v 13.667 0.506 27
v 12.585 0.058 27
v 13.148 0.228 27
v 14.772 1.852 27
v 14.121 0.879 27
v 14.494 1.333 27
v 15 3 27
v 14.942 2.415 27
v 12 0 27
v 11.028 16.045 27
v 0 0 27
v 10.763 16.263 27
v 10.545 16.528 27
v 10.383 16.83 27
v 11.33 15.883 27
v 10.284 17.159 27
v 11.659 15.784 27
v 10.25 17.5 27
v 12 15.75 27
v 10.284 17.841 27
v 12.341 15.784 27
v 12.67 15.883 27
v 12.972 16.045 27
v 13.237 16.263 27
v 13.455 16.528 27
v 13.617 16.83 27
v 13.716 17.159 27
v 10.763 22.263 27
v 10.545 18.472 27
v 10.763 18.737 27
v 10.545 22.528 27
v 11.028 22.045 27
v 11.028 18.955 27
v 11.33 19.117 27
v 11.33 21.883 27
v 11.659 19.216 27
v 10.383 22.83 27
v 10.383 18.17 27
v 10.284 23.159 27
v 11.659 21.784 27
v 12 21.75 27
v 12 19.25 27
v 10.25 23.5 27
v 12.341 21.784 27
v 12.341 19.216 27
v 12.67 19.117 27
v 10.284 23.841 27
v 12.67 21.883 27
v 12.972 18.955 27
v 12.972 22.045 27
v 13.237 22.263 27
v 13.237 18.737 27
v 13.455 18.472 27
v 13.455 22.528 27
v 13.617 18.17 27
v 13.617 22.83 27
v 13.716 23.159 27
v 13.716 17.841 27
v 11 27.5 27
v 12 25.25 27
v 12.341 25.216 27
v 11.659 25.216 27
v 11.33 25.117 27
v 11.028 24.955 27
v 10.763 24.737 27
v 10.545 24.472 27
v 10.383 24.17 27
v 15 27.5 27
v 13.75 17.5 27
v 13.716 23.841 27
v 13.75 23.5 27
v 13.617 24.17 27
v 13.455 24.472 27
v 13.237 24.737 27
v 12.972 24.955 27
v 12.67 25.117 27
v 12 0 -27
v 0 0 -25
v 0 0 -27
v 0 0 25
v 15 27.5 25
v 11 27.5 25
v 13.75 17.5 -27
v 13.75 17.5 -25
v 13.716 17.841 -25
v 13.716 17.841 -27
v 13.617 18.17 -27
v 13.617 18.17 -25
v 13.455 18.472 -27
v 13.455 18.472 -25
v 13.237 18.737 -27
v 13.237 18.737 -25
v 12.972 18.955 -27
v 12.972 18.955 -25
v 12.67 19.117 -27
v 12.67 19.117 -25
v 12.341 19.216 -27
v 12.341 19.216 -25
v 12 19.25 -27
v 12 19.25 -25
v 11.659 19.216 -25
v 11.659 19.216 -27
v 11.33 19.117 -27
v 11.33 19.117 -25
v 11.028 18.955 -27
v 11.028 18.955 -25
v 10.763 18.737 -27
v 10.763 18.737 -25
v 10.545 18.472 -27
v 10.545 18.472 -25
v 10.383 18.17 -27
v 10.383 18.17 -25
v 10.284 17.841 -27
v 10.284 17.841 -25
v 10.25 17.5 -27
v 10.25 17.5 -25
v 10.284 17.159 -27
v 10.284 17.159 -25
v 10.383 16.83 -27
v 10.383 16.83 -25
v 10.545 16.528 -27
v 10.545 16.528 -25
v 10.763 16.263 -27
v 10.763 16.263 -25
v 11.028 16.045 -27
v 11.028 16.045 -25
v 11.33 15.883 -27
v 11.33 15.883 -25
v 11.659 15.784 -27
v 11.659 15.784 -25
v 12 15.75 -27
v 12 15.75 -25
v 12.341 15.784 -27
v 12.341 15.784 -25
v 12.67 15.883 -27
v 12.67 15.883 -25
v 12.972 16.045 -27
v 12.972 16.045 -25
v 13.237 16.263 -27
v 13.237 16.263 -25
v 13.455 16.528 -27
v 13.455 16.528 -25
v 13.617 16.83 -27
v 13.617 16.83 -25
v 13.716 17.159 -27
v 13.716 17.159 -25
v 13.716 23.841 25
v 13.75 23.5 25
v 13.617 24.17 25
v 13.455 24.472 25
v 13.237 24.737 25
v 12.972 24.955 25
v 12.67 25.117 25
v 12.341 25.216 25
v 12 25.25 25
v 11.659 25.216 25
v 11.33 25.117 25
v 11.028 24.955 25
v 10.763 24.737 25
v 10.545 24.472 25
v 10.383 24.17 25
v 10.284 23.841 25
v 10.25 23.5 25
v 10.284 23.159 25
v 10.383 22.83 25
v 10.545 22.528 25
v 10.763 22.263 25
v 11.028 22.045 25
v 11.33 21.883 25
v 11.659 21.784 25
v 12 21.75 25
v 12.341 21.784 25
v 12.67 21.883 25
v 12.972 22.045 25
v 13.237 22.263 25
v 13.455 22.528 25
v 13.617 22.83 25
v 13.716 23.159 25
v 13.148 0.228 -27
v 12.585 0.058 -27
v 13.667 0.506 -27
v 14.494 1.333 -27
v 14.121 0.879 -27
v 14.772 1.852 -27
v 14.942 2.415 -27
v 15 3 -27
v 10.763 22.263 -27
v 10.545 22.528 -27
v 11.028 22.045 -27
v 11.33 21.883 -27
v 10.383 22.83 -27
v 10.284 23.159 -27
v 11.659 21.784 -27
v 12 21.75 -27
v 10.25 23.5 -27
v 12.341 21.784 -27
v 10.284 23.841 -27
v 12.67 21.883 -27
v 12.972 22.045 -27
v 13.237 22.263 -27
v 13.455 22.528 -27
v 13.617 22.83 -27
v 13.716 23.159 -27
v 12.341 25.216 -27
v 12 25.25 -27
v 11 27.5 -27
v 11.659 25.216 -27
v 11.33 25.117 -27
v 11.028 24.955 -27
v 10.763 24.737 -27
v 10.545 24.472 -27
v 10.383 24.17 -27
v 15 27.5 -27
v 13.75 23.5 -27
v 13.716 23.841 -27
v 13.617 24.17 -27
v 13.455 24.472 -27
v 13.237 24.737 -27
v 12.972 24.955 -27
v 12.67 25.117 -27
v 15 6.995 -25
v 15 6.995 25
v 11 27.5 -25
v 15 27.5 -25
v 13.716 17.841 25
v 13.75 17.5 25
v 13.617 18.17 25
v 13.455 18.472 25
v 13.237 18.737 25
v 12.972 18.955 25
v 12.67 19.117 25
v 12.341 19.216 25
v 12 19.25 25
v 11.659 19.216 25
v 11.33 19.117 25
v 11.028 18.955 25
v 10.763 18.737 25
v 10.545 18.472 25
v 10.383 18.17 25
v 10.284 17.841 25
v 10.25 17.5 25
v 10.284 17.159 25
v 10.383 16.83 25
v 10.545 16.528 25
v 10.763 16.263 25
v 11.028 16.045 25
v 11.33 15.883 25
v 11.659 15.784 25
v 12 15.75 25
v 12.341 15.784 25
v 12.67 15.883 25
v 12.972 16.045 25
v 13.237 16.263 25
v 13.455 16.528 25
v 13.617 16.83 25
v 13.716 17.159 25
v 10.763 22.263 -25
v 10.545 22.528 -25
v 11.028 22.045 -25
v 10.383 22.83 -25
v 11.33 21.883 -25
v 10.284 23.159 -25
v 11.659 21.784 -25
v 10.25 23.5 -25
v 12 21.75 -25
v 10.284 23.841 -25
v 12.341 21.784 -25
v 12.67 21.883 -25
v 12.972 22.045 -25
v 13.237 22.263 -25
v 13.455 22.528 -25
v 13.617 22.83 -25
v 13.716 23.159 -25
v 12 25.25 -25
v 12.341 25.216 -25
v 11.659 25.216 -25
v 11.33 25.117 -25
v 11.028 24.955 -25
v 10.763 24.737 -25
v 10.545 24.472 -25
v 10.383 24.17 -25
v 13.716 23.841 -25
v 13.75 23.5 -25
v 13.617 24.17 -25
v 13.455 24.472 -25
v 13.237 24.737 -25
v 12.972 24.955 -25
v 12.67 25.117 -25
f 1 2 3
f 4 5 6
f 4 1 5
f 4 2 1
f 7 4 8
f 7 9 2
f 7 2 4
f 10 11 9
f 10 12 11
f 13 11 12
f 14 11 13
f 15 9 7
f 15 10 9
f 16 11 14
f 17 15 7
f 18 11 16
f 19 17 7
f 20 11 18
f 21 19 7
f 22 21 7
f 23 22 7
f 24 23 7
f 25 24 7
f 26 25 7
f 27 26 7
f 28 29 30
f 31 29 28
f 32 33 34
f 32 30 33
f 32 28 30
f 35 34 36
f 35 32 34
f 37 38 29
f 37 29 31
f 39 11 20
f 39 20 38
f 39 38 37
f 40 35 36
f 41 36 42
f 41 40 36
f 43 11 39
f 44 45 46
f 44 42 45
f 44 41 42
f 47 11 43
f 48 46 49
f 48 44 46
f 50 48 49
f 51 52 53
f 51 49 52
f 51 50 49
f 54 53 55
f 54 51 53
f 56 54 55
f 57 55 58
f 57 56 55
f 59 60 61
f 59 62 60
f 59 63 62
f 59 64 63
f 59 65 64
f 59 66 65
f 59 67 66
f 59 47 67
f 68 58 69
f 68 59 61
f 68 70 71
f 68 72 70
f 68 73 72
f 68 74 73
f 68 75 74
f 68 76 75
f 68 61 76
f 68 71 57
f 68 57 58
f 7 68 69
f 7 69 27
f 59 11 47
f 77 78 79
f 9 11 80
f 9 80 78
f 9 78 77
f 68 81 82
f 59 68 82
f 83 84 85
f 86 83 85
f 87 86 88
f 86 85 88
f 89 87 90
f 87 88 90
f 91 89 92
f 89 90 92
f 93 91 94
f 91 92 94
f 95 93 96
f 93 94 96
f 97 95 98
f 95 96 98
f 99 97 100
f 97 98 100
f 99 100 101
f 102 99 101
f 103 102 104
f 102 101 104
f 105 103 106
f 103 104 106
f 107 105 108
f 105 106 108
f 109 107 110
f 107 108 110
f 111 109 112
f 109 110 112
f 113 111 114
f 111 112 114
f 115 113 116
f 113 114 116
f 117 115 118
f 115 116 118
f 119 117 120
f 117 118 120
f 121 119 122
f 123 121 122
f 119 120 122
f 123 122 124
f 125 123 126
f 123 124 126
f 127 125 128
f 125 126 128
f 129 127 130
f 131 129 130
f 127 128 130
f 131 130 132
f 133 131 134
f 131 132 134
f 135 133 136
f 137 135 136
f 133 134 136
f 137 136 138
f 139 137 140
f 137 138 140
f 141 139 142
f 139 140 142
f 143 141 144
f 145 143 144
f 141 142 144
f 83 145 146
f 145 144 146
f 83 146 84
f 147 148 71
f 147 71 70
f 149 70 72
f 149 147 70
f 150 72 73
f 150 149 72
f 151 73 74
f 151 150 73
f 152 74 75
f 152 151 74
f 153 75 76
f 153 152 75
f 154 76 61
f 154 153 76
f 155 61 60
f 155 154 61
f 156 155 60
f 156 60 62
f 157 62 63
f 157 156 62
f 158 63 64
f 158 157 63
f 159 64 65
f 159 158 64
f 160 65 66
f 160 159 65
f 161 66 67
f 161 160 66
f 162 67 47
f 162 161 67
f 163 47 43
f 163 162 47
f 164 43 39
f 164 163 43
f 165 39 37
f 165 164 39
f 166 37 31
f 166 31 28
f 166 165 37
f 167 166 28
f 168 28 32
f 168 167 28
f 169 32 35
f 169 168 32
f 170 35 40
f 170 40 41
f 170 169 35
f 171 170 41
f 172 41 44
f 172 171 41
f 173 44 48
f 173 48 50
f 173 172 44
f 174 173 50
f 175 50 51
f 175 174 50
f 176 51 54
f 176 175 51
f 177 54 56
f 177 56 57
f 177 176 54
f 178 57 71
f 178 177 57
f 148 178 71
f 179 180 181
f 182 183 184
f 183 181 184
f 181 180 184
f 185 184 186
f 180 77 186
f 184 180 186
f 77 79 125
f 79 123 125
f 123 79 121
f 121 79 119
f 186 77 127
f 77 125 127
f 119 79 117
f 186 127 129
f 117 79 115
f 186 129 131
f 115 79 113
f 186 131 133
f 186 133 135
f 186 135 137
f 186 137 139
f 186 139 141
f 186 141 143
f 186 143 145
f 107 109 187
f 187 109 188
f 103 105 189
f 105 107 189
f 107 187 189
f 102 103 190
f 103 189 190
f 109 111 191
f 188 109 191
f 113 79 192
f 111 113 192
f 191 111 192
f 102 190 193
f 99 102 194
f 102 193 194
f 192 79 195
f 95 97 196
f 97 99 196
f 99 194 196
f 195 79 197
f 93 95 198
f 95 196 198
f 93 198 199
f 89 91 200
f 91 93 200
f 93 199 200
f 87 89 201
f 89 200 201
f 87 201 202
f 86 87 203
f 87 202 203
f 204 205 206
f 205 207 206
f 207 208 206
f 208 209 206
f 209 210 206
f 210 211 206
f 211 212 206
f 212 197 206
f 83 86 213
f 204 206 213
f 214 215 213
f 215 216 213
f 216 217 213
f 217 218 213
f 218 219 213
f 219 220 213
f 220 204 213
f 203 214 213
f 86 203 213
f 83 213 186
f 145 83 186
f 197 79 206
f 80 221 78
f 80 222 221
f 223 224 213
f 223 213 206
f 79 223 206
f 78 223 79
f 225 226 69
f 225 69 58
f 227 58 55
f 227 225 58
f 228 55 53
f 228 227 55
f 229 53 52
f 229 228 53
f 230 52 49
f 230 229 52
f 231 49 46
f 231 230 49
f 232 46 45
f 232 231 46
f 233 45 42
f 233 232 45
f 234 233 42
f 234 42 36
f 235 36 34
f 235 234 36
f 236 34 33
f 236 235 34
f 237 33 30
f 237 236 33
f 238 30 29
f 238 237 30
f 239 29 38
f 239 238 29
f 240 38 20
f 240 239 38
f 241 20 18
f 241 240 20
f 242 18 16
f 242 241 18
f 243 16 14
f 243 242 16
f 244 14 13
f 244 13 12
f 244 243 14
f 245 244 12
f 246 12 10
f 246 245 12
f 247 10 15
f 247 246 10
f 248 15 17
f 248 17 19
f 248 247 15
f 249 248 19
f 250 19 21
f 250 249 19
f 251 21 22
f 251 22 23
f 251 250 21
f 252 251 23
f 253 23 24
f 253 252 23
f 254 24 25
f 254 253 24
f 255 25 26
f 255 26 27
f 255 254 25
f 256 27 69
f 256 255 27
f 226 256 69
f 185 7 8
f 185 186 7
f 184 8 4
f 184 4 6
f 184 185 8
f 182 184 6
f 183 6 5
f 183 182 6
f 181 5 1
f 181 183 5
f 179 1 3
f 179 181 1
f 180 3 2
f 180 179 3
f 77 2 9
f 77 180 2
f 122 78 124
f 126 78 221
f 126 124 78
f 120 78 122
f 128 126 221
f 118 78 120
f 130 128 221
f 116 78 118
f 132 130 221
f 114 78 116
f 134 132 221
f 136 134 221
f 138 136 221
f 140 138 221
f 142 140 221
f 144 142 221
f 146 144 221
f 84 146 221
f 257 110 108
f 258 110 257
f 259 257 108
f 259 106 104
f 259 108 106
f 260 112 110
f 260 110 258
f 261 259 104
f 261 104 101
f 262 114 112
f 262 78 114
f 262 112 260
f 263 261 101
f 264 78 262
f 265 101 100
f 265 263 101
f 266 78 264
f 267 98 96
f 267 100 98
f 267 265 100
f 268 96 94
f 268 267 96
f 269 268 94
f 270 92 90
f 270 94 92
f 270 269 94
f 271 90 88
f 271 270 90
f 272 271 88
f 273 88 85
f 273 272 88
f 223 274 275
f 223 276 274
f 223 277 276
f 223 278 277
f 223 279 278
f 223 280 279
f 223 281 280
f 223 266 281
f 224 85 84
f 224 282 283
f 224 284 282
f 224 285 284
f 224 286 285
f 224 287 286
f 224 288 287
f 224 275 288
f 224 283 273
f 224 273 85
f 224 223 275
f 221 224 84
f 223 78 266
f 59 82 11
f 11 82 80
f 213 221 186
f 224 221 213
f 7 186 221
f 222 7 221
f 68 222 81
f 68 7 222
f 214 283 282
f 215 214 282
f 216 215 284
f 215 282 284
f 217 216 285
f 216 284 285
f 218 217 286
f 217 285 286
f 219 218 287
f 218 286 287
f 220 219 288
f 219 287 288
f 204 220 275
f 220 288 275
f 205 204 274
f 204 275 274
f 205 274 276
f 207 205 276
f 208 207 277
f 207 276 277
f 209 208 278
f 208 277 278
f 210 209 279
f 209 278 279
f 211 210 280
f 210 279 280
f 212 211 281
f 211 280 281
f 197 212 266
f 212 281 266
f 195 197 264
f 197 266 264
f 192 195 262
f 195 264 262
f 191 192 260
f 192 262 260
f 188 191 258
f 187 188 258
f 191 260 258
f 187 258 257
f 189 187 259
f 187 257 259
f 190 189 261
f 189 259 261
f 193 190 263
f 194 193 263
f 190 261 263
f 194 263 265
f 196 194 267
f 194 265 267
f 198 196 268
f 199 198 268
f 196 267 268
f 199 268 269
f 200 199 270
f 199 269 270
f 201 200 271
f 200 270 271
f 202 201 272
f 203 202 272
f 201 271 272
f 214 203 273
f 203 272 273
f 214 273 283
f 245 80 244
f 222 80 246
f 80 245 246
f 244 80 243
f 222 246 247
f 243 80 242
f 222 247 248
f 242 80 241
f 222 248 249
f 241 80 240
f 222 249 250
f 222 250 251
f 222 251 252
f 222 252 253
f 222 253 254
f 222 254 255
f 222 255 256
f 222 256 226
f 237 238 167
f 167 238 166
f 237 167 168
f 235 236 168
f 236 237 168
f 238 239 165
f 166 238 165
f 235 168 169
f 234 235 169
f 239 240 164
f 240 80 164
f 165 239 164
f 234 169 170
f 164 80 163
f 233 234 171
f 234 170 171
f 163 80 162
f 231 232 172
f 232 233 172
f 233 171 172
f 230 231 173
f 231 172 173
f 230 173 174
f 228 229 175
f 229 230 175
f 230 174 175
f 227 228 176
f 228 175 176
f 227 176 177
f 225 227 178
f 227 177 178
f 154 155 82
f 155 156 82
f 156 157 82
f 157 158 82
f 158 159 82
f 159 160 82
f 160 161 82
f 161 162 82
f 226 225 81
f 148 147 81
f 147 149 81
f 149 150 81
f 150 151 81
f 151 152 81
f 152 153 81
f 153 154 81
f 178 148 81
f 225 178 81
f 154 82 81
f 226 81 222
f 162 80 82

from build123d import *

# Parameters (mm, degrees)
BOSS_EXTRUDE1_DEPTH = 25
SKETCH2_R           = 1.75
BOSS_EXTRUDE2_DEPTH = 2
FILLET1_R           = 3


with BuildPart() as part:
    # Sketch1 → Boss-Extrude1 (new, symmetric)
    with BuildSketch(Plane.XY):
        Polygon((0, 0), (15, 0), (15, 6.994614872), align=None)
    extrude(amount=BOSS_EXTRUDE1_DEPTH, both=True)

    # Sketch2 → Boss-Extrude2 (add)
    with BuildSketch(Plane.XY.offset(25)):
        Polygon((15, 0), (15, 27.5), (11, 27.5), (0, 0), align=None)
        with Locations((12, 23.5)):
            Circle(SKETCH2_R, mode=Mode.SUBTRACT)
        with Locations((12, 17.5)):
            Circle(SKETCH2_R, mode=Mode.SUBTRACT)
    boss_extrude2 = extrude(amount=BOSS_EXTRUDE2_DEPTH)

    # Mirror1: Boss-Extrude2 across plane
    add(boss_extrude2.mirror(Plane.XY))

    # Fillet1
    fillet1_edges = [part.edges().sort_by_distance(p)[0] for p in [
        (15, 0, 0),
    ]]
    fillet(fillet1_edges, radius=FILLET1_R)


solid = part.part
